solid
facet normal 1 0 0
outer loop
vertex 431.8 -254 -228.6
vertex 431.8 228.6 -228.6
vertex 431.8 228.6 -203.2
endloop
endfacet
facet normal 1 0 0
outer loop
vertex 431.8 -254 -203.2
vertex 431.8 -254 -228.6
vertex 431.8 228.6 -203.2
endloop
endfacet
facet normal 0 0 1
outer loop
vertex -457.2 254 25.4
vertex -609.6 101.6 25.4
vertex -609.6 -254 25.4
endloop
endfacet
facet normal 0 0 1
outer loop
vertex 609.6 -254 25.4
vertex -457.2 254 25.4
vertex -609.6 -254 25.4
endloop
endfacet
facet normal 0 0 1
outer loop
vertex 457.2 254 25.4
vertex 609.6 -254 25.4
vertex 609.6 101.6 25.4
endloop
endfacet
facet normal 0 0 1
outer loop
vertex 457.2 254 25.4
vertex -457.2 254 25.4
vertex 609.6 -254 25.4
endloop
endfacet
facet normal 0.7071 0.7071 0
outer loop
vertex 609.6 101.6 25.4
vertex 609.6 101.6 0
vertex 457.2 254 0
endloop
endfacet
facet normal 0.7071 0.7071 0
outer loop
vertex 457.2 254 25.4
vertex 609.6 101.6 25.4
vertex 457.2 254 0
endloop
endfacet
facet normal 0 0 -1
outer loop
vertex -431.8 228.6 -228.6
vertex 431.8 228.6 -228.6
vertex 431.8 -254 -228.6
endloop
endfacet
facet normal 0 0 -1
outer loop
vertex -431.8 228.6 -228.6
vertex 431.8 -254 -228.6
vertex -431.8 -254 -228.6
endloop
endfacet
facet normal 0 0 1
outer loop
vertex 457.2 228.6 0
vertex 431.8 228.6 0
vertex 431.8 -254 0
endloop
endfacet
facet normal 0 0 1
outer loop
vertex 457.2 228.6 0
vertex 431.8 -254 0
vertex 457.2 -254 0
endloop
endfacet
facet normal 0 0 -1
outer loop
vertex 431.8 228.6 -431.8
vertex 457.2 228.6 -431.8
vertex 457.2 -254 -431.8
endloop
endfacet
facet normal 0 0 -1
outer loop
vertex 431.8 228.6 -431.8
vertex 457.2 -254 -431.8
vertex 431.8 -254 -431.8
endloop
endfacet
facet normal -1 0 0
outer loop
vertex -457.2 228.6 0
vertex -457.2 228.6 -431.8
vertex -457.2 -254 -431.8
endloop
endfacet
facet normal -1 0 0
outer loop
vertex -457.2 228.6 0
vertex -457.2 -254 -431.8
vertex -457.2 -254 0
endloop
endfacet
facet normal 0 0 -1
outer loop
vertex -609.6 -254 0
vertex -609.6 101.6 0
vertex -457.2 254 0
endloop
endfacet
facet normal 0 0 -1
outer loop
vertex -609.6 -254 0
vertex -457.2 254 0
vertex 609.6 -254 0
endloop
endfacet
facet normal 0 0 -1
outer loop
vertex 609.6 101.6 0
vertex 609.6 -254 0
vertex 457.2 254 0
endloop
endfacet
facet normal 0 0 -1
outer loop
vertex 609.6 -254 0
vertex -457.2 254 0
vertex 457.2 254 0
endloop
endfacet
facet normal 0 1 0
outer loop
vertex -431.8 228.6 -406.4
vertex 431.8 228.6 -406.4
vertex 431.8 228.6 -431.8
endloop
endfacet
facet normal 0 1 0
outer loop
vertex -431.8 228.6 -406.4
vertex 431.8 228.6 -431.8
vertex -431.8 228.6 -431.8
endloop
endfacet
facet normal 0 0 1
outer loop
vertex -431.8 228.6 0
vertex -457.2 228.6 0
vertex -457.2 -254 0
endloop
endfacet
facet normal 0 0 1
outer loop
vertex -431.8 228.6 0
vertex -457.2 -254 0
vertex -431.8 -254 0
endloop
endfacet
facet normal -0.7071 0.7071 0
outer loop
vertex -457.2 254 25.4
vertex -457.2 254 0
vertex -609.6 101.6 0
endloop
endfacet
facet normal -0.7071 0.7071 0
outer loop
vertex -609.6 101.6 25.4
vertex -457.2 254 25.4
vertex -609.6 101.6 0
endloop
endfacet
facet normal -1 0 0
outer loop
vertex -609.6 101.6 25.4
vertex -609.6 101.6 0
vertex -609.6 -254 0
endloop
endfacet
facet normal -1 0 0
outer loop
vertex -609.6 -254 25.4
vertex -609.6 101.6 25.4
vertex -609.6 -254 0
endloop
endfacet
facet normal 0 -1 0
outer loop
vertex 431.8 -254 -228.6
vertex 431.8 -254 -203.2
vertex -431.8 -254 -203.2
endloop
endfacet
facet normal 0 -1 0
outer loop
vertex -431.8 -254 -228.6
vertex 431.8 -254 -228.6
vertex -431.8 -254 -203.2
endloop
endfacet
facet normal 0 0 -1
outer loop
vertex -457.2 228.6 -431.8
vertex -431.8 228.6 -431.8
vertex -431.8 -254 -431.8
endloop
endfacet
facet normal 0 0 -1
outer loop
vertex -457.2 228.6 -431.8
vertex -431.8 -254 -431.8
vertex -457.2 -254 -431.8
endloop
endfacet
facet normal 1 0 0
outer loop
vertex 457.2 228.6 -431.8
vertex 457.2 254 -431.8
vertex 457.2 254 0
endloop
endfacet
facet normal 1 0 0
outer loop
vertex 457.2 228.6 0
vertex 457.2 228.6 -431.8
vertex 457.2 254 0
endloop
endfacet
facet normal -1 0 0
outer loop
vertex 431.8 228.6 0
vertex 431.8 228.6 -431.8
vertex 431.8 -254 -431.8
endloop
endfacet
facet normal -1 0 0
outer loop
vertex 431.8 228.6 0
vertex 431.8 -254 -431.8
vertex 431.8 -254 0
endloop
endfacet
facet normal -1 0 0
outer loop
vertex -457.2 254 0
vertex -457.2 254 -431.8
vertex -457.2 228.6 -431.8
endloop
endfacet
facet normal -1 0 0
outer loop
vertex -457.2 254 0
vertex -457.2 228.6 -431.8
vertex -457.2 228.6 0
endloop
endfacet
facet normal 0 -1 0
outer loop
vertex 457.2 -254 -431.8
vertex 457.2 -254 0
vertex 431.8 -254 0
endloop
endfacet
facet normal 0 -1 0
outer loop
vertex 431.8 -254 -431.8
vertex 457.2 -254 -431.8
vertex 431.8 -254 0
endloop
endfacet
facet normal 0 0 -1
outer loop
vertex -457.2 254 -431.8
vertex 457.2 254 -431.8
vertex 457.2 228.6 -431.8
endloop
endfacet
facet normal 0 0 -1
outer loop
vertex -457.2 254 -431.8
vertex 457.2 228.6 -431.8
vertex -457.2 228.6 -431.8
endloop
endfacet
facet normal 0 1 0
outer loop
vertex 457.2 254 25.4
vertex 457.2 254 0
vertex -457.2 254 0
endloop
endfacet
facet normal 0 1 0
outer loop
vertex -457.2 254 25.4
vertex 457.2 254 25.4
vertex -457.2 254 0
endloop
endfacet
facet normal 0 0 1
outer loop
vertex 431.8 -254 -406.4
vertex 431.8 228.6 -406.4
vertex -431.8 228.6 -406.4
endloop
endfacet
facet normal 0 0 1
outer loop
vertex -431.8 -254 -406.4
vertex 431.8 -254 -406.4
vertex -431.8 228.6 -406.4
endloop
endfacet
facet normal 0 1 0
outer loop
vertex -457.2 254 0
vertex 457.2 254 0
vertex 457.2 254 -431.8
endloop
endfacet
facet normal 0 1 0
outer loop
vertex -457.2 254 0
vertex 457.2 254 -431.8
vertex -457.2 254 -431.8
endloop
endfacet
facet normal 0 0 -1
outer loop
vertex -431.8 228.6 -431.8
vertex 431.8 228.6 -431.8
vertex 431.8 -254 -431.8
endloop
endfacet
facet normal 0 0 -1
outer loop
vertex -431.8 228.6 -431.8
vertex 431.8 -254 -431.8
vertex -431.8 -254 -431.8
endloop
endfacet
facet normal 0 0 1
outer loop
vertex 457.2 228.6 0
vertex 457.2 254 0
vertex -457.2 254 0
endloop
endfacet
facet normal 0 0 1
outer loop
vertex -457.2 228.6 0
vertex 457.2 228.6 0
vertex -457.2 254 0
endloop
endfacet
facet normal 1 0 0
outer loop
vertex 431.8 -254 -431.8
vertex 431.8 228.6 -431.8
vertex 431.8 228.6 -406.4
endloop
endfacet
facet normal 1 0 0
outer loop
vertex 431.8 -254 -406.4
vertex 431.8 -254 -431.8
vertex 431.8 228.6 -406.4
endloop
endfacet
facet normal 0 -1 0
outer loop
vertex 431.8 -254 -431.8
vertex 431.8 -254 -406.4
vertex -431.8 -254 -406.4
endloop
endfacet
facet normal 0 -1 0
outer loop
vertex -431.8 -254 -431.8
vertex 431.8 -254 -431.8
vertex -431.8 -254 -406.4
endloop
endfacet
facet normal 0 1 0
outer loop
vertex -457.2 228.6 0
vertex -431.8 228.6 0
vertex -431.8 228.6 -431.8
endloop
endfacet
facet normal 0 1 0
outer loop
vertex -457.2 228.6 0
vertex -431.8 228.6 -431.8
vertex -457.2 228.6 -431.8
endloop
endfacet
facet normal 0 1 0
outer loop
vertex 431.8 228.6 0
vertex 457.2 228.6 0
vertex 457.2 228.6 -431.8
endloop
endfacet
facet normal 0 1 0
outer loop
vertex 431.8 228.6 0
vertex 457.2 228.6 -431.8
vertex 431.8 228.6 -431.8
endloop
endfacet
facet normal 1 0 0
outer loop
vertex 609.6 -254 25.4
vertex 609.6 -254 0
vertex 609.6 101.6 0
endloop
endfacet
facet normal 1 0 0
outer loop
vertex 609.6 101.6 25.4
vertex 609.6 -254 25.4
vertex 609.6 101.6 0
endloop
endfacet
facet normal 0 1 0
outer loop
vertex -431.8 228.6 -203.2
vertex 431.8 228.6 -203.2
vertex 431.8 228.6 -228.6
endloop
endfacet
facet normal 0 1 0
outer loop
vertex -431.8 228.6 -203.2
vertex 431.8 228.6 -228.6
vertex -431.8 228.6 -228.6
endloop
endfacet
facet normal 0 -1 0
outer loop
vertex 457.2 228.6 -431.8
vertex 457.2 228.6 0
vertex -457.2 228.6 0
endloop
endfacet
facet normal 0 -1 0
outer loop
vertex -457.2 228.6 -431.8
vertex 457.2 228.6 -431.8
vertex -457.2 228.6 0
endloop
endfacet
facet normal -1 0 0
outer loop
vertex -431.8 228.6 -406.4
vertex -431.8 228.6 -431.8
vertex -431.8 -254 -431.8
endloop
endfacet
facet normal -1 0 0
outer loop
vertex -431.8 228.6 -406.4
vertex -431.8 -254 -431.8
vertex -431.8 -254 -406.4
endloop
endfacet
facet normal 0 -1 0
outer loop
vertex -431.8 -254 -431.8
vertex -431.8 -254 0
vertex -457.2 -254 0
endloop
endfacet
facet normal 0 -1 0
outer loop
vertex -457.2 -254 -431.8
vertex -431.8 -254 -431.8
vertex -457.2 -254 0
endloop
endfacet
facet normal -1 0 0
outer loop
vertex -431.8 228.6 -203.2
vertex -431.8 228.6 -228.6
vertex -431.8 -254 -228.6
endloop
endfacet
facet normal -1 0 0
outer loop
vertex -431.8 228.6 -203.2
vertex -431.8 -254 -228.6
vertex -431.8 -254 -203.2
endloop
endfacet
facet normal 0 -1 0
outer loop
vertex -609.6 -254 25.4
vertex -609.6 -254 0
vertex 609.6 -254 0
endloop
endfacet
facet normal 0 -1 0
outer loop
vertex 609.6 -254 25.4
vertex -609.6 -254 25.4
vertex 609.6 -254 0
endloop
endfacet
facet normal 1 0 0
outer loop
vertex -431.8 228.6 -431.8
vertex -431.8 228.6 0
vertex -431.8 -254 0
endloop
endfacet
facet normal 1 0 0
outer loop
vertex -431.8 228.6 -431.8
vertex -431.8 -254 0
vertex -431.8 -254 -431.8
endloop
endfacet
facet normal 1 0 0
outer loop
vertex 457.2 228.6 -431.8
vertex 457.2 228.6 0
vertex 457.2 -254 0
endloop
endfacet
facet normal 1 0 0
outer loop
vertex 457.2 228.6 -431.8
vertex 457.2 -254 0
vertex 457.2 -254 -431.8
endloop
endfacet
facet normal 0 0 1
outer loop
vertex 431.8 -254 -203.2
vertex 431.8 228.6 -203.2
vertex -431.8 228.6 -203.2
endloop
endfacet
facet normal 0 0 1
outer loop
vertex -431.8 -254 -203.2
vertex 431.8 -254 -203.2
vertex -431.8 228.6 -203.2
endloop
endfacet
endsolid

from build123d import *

# Parameters (mm, degrees)
F1_DEPTH = 25.4
F3_START = -25.4
F3_DEPTH = 482.6
F4_START = -25.4
F2_W     = 863.6
F2_H     = 25.4
F4_DEPTH = 482.6
F5_W     = 914.4
F5_H     = 431.8
F6_DEPTH = 25.4


with BuildPart() as f1:
    # F0 (on Top) → F1 (new body)
    with BuildSketch(Plane.XY):
        Polygon((609.6, 101.6), (457.2, 254), (-457.2, 254), (-609.6, 101.6), (-609.6, -254), (609.6, -254), align=None)
    extrude(amount=F1_DEPTH)


with BuildPart() as f3:
    # F2 (on face) → F3 (new body)
    with BuildSketch(Plane(origin=(0, 254, 0), x_dir=(-1, 0, 0), z_dir=(0, 1, 0)).offset(F3_START)):
        Polygon((-431.8, 0), (-457.2, 0), (-457.2, -431.8), (-431.8, -431.8), (-431.8, -406.4), (-431.8, -228.6), (-431.8, -203.2), align=None)
    extrude(amount=-F3_DEPTH)


with BuildPart() as f3b:
    # F2 (on face) → F3, piece 2 (new body)
    with BuildSketch(Plane(origin=(0, 254, 0), x_dir=(-1, 0, 0), z_dir=(0, 1, 0)).offset(F3_START)):
        Polygon((457.2, 0), (431.8, 0), (431.8, -203.2), (431.8, -228.6), (431.8, -406.4), (431.8, -431.8), (457.2, -431.8), align=None)
    extrude(amount=-F3_DEPTH)


with BuildPart() as f4:
    # F2 (on face) → F4 (new body)
    with BuildSketch(Plane(origin=(0, 254, 0), x_dir=(-1, 0, 0), z_dir=(0, 1, 0)).offset(F4_START)):
        with Locations((0, -215.9)):
            Rectangle(F2_W, F2_H)
    extrude(amount=-F4_DEPTH)


with BuildPart() as f4b:
    # F2 (on face) → F4, piece 2 (new body)
    with BuildSketch(Plane(origin=(0, 254, 0), x_dir=(-1, 0, 0), z_dir=(0, 1, 0)).offset(F4_START)):
        with Locations((0, -419.1)):
            Rectangle(F2_W, F2_H)
    extrude(amount=-F4_DEPTH)


with BuildPart() as f6:
    # F5 (on face) → F6 (new body)
    with BuildSketch(Plane(origin=(0, 254, 0), x_dir=(-1, 0, 0), z_dir=(0, 1, 0))):
        with Locations((0, -215.9)):
            Rectangle(F5_W, F5_H)
    extrude(amount=-F6_DEPTH)


solid = Compound([f1.part, f3.part, f3b.part, f4.part, f4b.part, f6.part])
